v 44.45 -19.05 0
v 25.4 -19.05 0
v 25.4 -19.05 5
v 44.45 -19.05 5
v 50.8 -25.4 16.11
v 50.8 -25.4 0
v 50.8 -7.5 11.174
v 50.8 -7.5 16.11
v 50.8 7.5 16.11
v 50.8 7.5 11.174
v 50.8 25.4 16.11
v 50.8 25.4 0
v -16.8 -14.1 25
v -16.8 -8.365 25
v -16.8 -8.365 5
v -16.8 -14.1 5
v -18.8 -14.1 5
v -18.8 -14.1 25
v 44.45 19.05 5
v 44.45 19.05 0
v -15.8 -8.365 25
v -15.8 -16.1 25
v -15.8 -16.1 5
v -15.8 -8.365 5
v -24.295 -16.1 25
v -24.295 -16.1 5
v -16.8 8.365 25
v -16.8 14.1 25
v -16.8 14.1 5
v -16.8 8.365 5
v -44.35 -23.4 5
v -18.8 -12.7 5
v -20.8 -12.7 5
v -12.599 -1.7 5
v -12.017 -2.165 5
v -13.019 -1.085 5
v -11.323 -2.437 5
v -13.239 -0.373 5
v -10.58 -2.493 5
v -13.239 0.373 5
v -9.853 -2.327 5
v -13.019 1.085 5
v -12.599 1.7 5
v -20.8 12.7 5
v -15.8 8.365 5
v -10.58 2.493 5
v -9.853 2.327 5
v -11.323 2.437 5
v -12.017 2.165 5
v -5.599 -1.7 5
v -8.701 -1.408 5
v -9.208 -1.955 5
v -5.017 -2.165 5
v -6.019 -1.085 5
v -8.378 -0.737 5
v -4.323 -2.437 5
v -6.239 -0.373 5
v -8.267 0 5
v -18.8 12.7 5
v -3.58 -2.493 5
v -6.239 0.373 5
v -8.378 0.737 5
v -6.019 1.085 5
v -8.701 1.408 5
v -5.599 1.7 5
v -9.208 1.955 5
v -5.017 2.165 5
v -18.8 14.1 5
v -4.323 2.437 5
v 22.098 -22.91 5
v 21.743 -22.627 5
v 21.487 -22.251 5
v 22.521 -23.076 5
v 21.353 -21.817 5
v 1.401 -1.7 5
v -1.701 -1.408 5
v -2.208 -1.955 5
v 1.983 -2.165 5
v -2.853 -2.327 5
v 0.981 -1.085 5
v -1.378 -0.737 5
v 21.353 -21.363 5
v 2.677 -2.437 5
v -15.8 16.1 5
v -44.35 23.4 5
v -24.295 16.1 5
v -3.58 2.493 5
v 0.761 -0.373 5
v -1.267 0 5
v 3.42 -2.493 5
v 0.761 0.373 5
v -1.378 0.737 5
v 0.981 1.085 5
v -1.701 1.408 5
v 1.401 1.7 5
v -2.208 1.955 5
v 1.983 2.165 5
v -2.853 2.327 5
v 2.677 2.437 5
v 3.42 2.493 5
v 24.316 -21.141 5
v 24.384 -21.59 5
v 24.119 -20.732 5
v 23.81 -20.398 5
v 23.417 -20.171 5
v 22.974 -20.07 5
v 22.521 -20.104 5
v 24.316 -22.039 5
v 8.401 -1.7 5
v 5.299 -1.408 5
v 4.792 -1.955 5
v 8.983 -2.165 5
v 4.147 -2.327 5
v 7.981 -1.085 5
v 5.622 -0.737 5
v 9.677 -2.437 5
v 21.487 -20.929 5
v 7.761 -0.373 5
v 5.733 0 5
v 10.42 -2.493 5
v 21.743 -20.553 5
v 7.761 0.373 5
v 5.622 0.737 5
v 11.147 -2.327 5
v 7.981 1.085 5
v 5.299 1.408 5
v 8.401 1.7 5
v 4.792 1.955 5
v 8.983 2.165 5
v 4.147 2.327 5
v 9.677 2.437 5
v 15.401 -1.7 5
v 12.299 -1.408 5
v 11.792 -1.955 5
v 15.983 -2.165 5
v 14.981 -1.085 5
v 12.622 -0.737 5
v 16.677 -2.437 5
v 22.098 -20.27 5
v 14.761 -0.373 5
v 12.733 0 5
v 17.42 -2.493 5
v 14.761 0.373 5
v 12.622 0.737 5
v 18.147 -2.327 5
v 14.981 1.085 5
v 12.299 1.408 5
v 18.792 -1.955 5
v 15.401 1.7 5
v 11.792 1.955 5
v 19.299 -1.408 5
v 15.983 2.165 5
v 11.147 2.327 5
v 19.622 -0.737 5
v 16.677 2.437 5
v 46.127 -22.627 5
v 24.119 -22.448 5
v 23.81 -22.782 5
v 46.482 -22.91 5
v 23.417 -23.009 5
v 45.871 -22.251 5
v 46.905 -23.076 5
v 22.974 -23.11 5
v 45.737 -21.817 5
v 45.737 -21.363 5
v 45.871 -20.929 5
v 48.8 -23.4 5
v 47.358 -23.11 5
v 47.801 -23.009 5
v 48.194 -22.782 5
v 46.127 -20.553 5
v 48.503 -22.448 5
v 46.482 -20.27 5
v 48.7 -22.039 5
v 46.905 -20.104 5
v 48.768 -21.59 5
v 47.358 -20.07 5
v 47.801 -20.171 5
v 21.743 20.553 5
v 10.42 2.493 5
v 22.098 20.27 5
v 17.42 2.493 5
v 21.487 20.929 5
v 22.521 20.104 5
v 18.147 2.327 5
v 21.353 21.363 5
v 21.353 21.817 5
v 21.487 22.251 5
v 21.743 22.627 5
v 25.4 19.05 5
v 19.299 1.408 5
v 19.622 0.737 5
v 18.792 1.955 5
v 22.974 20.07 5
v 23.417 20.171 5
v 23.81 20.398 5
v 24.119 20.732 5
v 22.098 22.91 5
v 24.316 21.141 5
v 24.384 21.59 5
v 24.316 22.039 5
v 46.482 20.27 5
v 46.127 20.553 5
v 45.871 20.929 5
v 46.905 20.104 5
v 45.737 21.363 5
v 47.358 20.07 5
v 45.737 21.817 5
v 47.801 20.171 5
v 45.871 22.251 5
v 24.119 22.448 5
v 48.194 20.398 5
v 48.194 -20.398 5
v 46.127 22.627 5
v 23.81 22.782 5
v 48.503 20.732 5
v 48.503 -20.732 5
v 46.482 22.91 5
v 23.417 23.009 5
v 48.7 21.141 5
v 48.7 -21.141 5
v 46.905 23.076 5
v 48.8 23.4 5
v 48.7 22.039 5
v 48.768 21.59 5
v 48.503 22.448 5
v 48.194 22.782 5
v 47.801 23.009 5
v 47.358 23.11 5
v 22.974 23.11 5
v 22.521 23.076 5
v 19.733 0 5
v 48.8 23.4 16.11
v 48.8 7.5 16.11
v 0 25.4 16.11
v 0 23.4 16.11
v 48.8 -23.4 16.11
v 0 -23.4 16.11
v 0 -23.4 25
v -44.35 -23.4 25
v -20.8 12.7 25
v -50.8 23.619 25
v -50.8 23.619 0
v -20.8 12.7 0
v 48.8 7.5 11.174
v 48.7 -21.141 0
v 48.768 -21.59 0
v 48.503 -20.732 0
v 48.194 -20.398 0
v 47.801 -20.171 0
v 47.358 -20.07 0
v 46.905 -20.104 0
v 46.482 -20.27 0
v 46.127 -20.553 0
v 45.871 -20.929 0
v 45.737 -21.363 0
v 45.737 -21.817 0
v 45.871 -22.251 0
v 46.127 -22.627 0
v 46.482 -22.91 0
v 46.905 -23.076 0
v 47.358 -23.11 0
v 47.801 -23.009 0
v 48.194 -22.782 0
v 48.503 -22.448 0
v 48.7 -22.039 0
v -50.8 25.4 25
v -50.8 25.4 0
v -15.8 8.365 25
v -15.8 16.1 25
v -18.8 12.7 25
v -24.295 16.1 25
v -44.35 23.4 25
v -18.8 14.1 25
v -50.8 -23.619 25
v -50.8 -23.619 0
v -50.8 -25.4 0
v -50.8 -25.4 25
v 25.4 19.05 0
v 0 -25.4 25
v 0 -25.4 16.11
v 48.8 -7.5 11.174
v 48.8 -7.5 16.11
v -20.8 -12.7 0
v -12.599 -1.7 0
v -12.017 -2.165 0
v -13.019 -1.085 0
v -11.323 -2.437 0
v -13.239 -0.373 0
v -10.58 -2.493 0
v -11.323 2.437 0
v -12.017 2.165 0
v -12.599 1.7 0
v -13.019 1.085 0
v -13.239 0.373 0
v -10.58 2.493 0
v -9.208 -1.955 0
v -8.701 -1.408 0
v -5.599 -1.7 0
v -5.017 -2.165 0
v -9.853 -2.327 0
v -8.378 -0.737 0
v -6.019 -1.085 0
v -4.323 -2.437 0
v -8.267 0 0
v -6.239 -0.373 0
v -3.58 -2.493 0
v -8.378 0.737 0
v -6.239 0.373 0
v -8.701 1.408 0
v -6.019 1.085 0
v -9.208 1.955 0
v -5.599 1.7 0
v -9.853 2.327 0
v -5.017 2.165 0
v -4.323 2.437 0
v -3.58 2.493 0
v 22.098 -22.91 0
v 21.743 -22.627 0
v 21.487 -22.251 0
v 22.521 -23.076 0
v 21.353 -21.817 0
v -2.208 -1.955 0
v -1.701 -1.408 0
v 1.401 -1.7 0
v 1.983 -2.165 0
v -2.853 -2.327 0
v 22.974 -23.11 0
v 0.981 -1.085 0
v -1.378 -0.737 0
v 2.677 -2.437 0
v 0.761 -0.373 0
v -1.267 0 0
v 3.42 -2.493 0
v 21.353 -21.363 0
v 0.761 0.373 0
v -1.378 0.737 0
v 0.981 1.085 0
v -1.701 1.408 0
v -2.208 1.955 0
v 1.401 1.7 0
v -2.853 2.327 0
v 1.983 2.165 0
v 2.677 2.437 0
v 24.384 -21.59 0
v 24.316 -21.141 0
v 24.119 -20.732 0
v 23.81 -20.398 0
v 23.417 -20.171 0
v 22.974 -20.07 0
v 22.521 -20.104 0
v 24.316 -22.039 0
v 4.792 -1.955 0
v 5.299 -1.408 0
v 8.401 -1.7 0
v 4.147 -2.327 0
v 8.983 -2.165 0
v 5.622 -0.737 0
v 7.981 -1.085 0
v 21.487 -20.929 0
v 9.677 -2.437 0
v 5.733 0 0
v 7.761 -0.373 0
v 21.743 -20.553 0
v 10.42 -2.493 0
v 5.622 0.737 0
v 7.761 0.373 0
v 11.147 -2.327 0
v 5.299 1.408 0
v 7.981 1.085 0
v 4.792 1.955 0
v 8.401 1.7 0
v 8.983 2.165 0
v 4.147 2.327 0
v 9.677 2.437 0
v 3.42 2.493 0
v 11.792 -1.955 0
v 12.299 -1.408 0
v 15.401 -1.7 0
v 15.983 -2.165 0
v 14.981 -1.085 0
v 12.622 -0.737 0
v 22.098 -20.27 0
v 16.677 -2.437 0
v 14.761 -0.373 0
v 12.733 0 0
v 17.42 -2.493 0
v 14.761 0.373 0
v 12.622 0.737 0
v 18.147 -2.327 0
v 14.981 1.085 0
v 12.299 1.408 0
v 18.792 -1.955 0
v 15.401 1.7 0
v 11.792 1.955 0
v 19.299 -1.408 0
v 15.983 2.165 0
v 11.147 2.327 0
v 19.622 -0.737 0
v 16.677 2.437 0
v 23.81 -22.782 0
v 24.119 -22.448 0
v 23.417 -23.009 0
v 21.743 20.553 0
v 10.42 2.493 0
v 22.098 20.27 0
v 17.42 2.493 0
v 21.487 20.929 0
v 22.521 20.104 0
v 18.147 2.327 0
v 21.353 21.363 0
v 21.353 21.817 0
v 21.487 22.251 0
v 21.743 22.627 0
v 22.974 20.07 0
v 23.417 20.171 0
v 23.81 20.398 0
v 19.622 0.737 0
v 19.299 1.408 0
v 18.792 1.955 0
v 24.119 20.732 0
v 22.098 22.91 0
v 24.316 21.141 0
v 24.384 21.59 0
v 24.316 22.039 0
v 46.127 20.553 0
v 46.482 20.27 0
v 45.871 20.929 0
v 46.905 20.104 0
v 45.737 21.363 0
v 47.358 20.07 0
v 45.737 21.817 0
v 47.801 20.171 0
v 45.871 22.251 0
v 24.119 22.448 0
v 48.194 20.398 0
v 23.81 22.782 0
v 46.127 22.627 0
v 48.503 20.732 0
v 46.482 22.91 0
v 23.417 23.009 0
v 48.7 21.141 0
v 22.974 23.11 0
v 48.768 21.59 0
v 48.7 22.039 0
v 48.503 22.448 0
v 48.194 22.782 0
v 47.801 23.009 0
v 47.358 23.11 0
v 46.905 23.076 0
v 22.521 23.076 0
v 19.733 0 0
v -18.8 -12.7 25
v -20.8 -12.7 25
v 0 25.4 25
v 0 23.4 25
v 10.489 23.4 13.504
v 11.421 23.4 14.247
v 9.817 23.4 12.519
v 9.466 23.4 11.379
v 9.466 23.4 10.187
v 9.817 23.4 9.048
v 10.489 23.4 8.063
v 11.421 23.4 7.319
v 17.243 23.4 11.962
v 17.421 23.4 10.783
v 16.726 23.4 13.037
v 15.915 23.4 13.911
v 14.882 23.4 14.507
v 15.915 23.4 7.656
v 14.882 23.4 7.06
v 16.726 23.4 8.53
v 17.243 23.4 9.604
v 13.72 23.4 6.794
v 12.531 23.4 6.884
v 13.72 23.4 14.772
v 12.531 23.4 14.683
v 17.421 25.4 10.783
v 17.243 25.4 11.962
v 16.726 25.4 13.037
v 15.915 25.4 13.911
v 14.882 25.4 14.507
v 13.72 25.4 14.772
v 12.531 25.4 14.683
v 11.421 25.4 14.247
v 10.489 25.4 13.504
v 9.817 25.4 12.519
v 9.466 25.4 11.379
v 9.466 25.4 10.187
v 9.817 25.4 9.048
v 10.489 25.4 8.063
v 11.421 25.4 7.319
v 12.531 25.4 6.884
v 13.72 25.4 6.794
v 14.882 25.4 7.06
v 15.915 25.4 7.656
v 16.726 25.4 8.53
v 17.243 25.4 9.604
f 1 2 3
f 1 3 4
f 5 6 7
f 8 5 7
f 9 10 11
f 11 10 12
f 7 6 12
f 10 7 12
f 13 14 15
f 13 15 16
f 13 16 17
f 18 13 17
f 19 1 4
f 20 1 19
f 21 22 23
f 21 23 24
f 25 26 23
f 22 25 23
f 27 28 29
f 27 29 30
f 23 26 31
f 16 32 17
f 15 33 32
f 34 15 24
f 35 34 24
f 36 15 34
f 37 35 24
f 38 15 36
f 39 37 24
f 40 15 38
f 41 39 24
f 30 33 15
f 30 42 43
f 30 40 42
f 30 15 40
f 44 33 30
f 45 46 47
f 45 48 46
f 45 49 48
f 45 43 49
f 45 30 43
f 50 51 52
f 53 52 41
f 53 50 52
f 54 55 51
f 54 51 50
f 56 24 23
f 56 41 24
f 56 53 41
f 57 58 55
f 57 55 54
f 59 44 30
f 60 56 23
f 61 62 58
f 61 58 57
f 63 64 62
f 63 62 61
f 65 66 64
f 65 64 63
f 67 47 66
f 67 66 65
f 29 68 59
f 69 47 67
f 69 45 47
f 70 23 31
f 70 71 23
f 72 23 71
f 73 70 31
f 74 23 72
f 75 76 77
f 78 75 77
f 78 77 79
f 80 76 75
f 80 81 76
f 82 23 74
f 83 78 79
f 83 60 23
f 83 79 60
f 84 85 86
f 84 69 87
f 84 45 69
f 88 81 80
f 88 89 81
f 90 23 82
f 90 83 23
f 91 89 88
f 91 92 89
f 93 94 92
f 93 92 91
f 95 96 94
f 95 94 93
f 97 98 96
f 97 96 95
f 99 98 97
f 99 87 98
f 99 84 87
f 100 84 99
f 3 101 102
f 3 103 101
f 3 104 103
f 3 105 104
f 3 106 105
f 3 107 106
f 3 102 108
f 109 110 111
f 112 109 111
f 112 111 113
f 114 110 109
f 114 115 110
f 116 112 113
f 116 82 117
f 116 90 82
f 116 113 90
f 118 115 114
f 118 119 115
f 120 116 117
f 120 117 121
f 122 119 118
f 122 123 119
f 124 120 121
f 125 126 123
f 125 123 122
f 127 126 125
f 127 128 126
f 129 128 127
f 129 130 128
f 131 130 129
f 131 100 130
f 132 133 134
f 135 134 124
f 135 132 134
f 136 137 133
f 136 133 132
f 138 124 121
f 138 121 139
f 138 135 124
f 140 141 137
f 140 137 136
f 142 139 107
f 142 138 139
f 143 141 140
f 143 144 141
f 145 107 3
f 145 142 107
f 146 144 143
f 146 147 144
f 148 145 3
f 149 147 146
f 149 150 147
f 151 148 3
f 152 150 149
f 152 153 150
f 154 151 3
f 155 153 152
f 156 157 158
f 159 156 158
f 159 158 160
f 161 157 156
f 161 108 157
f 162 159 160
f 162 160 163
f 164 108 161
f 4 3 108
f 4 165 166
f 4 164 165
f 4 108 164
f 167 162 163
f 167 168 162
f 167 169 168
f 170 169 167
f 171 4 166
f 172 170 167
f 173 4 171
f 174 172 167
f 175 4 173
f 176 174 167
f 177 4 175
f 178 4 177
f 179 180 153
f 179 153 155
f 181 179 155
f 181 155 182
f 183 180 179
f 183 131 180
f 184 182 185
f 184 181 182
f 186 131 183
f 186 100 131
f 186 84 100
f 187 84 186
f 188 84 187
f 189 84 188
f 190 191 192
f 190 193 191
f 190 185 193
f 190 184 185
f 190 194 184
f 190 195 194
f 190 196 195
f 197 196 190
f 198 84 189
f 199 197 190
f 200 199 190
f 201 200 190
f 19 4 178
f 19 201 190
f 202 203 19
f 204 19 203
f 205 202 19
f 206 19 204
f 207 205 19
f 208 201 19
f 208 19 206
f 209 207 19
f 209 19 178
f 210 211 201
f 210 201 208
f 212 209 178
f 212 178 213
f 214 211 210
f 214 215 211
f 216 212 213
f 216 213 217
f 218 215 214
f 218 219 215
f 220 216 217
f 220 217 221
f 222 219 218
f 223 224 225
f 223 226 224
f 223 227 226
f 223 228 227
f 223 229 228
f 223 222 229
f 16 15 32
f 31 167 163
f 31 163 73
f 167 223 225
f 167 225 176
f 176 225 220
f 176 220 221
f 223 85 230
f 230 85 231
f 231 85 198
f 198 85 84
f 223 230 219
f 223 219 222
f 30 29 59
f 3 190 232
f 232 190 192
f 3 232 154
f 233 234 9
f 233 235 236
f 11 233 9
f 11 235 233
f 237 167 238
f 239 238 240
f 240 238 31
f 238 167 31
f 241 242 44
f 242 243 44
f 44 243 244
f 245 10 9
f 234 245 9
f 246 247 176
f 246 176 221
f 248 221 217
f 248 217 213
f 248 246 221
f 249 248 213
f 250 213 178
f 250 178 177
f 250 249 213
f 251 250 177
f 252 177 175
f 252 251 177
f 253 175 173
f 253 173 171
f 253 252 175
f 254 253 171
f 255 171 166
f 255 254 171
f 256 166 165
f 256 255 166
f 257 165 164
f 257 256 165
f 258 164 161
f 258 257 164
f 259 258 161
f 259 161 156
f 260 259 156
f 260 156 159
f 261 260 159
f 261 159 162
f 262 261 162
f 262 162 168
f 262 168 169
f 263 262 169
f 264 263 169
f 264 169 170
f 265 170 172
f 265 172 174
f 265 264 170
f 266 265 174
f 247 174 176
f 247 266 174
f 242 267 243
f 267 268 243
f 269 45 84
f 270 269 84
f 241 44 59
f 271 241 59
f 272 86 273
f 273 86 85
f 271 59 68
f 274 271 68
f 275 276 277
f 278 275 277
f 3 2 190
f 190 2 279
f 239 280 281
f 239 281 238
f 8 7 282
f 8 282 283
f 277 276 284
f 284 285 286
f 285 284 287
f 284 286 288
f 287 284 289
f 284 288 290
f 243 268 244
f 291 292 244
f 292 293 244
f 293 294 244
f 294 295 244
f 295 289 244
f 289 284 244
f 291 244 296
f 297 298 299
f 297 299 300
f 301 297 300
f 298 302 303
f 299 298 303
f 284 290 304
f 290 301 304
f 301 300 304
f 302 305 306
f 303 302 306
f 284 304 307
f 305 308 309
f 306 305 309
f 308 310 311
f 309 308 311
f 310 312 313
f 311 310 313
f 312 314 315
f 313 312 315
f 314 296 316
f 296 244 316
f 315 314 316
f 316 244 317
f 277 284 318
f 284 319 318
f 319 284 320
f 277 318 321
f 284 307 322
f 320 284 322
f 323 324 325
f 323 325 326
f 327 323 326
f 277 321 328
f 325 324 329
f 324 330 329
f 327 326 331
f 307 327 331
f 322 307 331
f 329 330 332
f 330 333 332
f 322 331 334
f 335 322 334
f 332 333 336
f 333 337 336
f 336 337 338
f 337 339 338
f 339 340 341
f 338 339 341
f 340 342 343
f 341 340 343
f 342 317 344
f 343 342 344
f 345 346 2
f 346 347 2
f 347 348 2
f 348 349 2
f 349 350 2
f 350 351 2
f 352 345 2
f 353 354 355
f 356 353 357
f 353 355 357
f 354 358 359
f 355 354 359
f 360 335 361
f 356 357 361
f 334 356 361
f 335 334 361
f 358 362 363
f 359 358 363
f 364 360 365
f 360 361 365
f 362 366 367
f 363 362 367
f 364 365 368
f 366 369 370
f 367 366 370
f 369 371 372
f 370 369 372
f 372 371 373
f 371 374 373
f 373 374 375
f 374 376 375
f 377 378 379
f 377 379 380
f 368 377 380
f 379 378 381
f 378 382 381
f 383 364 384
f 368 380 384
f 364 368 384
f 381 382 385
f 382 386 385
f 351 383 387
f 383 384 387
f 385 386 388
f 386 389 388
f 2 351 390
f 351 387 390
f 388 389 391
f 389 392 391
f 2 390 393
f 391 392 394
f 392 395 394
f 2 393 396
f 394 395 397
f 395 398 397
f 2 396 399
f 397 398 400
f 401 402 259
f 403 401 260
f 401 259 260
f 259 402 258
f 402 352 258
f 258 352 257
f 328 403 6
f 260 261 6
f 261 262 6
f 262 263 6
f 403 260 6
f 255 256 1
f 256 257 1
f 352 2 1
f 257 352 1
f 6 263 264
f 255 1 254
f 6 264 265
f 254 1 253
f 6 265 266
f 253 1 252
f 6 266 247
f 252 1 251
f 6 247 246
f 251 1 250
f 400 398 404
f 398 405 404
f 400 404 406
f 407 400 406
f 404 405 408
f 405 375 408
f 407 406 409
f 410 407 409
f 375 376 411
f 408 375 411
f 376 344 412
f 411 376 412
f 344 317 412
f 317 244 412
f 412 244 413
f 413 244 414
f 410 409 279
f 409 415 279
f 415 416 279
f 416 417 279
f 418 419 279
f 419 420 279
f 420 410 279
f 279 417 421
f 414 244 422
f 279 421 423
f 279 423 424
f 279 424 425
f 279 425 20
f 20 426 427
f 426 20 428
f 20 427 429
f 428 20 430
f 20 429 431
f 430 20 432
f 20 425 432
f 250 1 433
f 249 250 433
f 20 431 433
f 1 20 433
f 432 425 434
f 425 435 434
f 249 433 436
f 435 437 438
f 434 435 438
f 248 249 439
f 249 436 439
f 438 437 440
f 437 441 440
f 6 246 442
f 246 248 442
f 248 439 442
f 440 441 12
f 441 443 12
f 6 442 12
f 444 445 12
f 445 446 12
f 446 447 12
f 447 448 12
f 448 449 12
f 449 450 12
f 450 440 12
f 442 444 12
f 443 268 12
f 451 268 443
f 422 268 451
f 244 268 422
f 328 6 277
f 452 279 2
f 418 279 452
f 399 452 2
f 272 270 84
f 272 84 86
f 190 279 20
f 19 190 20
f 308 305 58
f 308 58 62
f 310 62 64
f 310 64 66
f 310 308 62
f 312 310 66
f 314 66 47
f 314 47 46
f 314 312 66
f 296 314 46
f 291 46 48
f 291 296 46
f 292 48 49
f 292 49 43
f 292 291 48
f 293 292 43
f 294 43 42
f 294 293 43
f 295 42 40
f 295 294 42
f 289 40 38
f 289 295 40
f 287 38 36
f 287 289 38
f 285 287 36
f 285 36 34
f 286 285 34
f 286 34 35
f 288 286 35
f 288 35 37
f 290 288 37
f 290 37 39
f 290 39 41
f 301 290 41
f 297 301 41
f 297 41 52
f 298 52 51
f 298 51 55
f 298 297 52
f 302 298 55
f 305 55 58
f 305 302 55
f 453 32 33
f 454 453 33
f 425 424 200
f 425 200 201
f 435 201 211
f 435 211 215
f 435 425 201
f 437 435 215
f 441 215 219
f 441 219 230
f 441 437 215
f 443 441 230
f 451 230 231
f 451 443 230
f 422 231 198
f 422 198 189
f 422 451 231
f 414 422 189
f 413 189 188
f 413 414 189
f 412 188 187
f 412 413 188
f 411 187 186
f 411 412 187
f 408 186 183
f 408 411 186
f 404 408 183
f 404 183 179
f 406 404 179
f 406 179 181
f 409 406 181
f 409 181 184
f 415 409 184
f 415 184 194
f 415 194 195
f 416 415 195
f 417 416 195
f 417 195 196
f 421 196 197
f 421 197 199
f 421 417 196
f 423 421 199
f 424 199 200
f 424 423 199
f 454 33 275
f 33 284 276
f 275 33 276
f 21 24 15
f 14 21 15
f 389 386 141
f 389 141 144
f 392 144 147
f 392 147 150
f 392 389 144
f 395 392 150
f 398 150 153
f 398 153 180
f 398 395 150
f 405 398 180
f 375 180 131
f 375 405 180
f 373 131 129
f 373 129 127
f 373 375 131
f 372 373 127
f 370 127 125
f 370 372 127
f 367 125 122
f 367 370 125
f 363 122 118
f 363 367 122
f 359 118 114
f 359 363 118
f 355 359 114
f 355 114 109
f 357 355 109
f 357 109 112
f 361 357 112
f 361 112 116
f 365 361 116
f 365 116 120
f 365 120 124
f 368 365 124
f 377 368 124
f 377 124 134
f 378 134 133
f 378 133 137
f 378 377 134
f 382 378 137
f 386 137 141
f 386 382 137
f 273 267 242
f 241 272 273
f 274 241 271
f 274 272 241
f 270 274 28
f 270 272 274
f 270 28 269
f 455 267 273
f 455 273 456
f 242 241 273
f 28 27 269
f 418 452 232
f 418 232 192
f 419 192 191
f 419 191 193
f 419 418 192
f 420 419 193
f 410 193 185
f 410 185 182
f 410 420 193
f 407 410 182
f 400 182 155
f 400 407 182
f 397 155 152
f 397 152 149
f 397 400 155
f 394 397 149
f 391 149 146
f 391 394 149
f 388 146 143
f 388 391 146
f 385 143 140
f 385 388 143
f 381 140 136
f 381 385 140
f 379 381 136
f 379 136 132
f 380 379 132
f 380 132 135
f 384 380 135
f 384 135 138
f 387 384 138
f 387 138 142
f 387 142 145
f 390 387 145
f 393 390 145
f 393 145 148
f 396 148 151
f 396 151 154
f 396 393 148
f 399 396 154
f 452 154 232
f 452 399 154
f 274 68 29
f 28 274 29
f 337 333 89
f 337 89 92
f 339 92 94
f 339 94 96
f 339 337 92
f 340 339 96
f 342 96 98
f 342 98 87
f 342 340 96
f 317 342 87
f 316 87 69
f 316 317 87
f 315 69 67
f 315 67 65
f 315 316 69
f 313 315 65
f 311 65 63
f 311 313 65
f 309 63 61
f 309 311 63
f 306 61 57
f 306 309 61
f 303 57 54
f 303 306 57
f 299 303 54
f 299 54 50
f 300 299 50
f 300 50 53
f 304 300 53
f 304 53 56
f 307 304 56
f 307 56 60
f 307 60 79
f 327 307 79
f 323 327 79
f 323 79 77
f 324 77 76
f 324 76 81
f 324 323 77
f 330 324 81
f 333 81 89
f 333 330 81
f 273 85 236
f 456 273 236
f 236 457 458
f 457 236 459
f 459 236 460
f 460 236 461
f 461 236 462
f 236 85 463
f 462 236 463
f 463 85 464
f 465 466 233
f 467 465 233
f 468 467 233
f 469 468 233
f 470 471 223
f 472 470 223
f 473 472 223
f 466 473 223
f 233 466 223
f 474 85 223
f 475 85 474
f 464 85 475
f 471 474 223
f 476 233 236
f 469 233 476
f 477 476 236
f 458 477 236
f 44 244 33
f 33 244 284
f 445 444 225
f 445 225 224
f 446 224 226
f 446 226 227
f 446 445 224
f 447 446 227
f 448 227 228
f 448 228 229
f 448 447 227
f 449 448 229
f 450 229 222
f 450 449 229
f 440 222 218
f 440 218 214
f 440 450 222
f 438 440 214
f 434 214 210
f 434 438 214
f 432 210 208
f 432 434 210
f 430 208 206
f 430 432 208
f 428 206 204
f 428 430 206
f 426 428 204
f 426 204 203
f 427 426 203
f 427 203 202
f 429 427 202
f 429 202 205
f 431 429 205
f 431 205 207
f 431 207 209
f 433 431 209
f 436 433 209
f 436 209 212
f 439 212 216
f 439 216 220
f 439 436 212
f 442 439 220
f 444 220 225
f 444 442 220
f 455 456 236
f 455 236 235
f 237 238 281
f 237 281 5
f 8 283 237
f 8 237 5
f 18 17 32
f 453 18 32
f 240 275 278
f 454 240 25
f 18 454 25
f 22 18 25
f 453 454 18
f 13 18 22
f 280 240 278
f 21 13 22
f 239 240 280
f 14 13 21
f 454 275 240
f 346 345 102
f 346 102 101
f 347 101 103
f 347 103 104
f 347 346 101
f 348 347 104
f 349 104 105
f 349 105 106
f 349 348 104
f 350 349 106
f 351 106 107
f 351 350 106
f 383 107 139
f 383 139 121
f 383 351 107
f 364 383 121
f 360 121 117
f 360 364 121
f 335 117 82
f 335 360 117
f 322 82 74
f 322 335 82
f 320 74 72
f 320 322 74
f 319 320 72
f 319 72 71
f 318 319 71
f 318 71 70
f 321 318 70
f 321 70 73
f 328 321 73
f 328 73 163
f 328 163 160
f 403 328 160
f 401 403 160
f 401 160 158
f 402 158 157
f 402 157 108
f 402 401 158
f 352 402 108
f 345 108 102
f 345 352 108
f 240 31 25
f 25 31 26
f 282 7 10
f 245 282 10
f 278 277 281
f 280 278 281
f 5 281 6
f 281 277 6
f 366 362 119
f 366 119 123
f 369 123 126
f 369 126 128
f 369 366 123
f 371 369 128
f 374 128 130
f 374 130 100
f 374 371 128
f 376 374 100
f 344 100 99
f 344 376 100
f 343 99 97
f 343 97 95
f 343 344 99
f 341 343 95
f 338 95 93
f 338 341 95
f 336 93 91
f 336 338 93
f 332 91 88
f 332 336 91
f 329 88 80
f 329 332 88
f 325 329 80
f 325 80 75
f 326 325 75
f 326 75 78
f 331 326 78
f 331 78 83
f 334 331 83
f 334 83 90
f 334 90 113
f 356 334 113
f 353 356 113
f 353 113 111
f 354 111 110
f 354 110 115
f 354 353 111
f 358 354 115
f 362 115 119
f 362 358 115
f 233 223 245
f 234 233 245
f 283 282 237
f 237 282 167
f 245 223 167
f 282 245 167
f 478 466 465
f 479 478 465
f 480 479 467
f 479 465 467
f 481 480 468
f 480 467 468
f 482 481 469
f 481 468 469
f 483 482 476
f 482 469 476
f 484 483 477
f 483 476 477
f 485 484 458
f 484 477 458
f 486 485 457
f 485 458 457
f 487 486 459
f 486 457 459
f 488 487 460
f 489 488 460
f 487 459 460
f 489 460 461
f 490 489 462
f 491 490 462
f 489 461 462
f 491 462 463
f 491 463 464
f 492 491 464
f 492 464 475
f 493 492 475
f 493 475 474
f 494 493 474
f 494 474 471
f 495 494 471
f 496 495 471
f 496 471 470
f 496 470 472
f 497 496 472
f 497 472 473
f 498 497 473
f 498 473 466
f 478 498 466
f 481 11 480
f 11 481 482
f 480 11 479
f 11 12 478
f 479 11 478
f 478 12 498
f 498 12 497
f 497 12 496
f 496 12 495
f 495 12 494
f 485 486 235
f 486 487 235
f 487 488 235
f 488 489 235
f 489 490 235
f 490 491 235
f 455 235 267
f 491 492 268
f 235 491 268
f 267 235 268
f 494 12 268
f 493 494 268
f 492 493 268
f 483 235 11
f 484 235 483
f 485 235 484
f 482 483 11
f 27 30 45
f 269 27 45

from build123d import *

# Parameters (mm, degrees)
F0_R     = 2.5
F0_R_2   = 1.524
F0_W     = 19.05
F0_H     = 38.1
F1_DEPTH = 5
F3_DEPTH = 20
F4_R     = 4
F5_DEPTH = 25.4
F6_W     = 50.8
F6_H     = 50.8
F7_DEPTH = 8.89
F8_W     = 15
F8_H     = 4.935952
F9_DEPTH = 25.4


with BuildPart() as f1:
    # F0 (on Top) → F1 (new body)
    with BuildSketch(Plane.XY):
        Polygon((50.8, 25.4), (-50.8, 25.4), (-50.8, 23.619107), (-20.8, 12.7), (-20.8, -12.7), (-50.8, -23.619107), (-50.8, -25.4), (50.8, -25.4), align=None)
        with Locations((-10.766795, 0)):
            Circle(F0_R, mode=Mode.SUBTRACT)
        with Locations((-3.766795, 0)):
            Circle(F0_R, mode=Mode.SUBTRACT)
        with Locations((22.86, -21.59)):
            Circle(F0_R_2, mode=Mode.SUBTRACT)
        with Locations((47.244, -21.59)):
            Circle(F0_R_2, mode=Mode.SUBTRACT)
        with Locations((3.233205, 0)):
            Circle(F0_R, mode=Mode.SUBTRACT)
        with Locations((10.233205, 0)):
            Circle(F0_R, mode=Mode.SUBTRACT)
        with Locations((17.233205, 0)):
            Circle(F0_R, mode=Mode.SUBTRACT)
        with Locations((34.925, 0)):
            Rectangle(F0_W, F0_H, mode=Mode.SUBTRACT)
        with Locations((22.86, 21.59)):
            Circle(F0_R_2, mode=Mode.SUBTRACT)
        with Locations((47.244, 21.59)):
            Circle(F0_R_2, mode=Mode.SUBTRACT)
    extrude(amount=F1_DEPTH)

    # F2 (on face) → F3 (join)
    with BuildSketch(Plane.XY.offset(5)):
        Polygon((50.8, -25.4), (50.8, 25.4), (-50.8, 25.4), (-50.8, 23.619107), (-20.8, 12.7), (-18.8, 12.7), (-18.8, 14.100415), (-16.8, 14.100415), (-16.8, 8.365211), (-15.8, 8.365211), (-15.8, 14.100415), (-15.8, 16.100415), (-24.294955, 16.100415), (-44.3504, 23.4), (48.8, 23.4), (48.8, -23.4), (-44.3504, -23.4), (-24.294955, -16.100415), (-15.8, -16.100415), (-15.8, -14.100415), (-15.8, -8.365211), (-16.8, -8.365211), (-16.8, -14.100415), (-18.8, -14.100415), (-18.8, -12.7), (-20.8, -12.7), (-50.8, -23.619107), (-50.8, -25.4), align=None)
    extrude(amount=F3_DEPTH)

    # F4 (on face) → F5 (cut)
    with BuildSketch(Plane.XZ.offset(-23.4)):
        with Locations((13.420951, 10.783263)):
            Circle(F4_R)
    extrude(amount=-F5_DEPTH, mode=Mode.SUBTRACT)

    # F6 (on face) → F7 (cut)
    with BuildSketch(Plane.XY.offset(25)):
        with Locations((25.4, 0)):
            Rectangle(F6_W, F6_H)
    extrude(amount=-F7_DEPTH, mode=Mode.SUBTRACT)

    # F8 (on face) → F9 (cut)
    with BuildSketch(Plane.YZ.offset(50.8)):
        with Locations((0, 13.642024)):
            Rectangle(F8_W, F8_H)
    extrude(amount=-F9_DEPTH, mode=Mode.SUBTRACT)


solid = f1.part
